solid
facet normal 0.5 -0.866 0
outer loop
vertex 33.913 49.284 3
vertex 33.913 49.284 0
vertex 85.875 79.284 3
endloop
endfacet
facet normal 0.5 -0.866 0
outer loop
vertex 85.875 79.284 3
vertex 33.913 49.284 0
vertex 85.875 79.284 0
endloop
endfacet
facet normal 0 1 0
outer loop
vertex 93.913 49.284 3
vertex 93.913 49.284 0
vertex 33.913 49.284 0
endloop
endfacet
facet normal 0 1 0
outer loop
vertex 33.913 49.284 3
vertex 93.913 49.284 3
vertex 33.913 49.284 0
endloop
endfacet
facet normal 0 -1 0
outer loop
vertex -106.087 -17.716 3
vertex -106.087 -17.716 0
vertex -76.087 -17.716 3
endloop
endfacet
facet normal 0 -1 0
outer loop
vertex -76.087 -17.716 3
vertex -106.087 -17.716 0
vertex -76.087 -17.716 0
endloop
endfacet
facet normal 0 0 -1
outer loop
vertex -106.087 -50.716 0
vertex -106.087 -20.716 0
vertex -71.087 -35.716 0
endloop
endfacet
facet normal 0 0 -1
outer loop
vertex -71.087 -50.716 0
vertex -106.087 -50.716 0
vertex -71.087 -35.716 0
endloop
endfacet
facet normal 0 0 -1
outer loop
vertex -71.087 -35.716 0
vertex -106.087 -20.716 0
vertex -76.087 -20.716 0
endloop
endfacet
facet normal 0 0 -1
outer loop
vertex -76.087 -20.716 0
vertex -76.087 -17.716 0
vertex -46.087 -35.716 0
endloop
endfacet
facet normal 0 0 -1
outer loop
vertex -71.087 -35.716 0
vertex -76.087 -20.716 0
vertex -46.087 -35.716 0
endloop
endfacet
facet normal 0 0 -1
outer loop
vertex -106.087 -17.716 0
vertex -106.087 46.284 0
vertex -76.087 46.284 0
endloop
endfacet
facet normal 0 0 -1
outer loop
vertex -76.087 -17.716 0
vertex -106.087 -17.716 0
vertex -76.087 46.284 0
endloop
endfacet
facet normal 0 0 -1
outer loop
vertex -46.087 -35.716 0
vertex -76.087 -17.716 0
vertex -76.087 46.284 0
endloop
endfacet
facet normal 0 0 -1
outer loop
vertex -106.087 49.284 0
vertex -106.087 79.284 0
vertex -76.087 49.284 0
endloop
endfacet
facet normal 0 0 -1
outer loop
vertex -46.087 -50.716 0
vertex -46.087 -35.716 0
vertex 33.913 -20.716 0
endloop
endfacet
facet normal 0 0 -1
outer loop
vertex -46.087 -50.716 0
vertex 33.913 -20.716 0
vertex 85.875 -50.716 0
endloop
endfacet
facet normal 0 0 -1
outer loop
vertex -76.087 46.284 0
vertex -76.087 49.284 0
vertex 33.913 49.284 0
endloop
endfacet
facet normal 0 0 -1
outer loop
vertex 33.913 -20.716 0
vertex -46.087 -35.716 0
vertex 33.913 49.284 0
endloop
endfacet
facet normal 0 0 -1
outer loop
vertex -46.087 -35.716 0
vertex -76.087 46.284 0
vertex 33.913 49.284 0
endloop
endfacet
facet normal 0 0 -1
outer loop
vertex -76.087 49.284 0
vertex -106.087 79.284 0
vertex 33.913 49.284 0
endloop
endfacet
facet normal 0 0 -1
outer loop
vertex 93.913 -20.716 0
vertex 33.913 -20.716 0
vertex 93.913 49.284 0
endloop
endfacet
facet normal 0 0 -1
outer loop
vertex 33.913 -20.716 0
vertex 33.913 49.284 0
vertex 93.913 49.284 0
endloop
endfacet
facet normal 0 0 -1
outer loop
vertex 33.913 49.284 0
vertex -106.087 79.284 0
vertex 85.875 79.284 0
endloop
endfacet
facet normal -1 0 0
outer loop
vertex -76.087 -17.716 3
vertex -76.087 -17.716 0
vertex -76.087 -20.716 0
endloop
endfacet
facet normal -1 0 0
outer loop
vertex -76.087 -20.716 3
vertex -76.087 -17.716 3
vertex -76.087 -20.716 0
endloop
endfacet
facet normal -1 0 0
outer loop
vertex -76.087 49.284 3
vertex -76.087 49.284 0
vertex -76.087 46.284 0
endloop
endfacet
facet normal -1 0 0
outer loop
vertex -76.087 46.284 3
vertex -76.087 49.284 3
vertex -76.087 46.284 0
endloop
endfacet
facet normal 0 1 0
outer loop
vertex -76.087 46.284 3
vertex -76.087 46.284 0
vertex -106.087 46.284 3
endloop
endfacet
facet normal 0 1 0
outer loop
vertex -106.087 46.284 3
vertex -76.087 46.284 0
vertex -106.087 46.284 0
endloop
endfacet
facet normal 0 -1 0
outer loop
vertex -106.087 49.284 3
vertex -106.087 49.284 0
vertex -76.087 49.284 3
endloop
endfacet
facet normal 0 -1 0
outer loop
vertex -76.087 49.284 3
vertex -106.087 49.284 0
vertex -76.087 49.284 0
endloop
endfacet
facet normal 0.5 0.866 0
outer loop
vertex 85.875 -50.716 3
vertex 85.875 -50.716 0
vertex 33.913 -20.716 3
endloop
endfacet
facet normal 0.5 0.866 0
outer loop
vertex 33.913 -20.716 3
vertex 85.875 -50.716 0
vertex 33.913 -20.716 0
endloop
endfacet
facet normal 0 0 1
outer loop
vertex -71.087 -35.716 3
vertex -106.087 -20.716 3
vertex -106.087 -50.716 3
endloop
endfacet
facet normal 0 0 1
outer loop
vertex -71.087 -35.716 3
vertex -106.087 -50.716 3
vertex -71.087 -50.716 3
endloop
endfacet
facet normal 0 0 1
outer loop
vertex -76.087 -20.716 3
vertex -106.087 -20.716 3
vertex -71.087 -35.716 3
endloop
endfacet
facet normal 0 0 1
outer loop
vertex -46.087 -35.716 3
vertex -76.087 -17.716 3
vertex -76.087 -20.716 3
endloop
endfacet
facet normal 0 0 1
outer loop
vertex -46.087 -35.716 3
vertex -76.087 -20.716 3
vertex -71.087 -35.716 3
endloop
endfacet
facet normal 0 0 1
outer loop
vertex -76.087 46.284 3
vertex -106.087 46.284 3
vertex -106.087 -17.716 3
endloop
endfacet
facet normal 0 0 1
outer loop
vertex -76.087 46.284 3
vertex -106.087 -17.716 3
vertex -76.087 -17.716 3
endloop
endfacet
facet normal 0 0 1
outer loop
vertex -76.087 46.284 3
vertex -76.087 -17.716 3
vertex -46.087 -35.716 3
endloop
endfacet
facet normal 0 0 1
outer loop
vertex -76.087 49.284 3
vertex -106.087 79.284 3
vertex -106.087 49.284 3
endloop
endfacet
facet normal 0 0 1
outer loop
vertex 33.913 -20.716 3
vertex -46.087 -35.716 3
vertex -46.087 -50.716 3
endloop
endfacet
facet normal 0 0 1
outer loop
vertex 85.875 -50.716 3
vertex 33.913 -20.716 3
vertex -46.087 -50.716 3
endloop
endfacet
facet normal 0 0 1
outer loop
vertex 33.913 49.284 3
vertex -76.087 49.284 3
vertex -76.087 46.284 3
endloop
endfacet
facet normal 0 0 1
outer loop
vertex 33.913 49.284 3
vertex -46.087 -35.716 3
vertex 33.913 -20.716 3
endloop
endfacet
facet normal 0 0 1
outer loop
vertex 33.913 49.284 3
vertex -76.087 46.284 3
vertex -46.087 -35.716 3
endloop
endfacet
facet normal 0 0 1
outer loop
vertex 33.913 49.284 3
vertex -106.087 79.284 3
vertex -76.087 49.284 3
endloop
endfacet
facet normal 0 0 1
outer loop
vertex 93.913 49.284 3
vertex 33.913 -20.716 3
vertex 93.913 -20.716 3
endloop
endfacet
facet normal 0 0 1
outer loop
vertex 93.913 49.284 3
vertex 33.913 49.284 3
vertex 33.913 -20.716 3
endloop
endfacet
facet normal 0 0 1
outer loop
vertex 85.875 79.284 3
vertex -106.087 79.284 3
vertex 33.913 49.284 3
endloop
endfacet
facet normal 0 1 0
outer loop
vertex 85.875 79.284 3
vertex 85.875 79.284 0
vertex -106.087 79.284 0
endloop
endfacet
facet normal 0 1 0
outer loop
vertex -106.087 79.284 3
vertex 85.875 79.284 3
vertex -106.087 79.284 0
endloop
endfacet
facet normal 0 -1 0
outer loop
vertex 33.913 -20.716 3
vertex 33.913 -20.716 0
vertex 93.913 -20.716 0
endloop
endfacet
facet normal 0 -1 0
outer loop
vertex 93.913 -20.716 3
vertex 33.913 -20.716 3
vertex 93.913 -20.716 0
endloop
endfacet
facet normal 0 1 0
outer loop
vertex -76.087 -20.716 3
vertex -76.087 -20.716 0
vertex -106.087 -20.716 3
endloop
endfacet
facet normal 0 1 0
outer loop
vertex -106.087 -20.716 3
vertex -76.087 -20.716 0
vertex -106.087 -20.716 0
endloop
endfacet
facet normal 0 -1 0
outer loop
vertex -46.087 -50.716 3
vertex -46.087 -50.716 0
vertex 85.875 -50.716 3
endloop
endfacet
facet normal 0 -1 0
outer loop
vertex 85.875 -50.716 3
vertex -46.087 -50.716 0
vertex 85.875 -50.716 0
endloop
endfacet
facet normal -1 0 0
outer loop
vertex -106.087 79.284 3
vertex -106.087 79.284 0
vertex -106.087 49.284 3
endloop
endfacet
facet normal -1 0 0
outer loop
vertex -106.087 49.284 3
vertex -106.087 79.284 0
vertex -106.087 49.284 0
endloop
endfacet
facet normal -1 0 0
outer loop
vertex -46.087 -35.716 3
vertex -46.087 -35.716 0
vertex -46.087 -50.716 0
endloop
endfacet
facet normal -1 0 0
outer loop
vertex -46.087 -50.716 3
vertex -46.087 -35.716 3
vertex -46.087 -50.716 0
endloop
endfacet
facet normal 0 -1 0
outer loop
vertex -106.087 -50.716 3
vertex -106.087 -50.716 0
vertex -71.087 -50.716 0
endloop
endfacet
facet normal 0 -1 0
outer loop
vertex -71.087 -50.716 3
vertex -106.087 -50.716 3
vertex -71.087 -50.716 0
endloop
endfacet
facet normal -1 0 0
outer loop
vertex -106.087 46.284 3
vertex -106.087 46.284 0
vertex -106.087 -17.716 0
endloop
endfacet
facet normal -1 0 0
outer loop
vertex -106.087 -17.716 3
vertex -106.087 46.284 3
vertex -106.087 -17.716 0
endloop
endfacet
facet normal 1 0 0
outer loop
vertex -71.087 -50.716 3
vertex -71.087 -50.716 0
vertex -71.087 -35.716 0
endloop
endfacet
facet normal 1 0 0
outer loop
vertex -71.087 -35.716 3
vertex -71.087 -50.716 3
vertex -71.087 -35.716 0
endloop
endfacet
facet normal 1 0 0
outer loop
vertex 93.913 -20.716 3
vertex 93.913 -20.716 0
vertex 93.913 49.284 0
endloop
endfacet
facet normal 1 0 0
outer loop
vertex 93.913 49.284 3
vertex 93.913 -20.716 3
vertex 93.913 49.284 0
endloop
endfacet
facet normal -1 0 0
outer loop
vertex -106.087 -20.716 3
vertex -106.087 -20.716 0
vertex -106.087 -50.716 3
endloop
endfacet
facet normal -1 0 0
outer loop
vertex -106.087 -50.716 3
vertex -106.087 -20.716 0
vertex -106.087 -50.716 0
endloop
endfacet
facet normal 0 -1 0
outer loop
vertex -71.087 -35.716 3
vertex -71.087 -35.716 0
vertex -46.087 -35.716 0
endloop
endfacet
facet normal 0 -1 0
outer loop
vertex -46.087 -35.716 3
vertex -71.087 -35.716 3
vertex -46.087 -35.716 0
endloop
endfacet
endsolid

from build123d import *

# Parameters (mm, degrees)
F1_DEPTH = 3


with BuildPart() as f1:
    # F0 (on Top) → F1 (new body)
    with BuildSketch(Plane.XY):
        Polygon((93.913308, 49.283788), (33.913308, 49.283788), (-76.086692, 49.283788), (-76.086692, 46.283788), (-106.086692, 46.283788), (-106.086692, -17.716212), (-76.086692, -17.716212), (-76.086692, -20.716212), (33.913308, -20.716212), (93.913308, -20.716212), align=None)
        Polygon((85.874832, -50.716212), (33.913308, -20.716212), (-76.086692, -20.716212), (-106.086692, -20.716212), (-106.086692, -50.716212), (-71.086692, -50.716212), (-71.086692, -35.716212), (-46.086692, -35.716212), (-46.086692, -50.716212), align=None)
        Polygon((85.874832, 79.283788), (-106.086692, 79.283788), (-106.086692, 49.283788), (-76.086692, 49.283788), (33.913308, 49.283788), align=None)
    extrude(amount=F1_DEPTH)


solid = f1.part
